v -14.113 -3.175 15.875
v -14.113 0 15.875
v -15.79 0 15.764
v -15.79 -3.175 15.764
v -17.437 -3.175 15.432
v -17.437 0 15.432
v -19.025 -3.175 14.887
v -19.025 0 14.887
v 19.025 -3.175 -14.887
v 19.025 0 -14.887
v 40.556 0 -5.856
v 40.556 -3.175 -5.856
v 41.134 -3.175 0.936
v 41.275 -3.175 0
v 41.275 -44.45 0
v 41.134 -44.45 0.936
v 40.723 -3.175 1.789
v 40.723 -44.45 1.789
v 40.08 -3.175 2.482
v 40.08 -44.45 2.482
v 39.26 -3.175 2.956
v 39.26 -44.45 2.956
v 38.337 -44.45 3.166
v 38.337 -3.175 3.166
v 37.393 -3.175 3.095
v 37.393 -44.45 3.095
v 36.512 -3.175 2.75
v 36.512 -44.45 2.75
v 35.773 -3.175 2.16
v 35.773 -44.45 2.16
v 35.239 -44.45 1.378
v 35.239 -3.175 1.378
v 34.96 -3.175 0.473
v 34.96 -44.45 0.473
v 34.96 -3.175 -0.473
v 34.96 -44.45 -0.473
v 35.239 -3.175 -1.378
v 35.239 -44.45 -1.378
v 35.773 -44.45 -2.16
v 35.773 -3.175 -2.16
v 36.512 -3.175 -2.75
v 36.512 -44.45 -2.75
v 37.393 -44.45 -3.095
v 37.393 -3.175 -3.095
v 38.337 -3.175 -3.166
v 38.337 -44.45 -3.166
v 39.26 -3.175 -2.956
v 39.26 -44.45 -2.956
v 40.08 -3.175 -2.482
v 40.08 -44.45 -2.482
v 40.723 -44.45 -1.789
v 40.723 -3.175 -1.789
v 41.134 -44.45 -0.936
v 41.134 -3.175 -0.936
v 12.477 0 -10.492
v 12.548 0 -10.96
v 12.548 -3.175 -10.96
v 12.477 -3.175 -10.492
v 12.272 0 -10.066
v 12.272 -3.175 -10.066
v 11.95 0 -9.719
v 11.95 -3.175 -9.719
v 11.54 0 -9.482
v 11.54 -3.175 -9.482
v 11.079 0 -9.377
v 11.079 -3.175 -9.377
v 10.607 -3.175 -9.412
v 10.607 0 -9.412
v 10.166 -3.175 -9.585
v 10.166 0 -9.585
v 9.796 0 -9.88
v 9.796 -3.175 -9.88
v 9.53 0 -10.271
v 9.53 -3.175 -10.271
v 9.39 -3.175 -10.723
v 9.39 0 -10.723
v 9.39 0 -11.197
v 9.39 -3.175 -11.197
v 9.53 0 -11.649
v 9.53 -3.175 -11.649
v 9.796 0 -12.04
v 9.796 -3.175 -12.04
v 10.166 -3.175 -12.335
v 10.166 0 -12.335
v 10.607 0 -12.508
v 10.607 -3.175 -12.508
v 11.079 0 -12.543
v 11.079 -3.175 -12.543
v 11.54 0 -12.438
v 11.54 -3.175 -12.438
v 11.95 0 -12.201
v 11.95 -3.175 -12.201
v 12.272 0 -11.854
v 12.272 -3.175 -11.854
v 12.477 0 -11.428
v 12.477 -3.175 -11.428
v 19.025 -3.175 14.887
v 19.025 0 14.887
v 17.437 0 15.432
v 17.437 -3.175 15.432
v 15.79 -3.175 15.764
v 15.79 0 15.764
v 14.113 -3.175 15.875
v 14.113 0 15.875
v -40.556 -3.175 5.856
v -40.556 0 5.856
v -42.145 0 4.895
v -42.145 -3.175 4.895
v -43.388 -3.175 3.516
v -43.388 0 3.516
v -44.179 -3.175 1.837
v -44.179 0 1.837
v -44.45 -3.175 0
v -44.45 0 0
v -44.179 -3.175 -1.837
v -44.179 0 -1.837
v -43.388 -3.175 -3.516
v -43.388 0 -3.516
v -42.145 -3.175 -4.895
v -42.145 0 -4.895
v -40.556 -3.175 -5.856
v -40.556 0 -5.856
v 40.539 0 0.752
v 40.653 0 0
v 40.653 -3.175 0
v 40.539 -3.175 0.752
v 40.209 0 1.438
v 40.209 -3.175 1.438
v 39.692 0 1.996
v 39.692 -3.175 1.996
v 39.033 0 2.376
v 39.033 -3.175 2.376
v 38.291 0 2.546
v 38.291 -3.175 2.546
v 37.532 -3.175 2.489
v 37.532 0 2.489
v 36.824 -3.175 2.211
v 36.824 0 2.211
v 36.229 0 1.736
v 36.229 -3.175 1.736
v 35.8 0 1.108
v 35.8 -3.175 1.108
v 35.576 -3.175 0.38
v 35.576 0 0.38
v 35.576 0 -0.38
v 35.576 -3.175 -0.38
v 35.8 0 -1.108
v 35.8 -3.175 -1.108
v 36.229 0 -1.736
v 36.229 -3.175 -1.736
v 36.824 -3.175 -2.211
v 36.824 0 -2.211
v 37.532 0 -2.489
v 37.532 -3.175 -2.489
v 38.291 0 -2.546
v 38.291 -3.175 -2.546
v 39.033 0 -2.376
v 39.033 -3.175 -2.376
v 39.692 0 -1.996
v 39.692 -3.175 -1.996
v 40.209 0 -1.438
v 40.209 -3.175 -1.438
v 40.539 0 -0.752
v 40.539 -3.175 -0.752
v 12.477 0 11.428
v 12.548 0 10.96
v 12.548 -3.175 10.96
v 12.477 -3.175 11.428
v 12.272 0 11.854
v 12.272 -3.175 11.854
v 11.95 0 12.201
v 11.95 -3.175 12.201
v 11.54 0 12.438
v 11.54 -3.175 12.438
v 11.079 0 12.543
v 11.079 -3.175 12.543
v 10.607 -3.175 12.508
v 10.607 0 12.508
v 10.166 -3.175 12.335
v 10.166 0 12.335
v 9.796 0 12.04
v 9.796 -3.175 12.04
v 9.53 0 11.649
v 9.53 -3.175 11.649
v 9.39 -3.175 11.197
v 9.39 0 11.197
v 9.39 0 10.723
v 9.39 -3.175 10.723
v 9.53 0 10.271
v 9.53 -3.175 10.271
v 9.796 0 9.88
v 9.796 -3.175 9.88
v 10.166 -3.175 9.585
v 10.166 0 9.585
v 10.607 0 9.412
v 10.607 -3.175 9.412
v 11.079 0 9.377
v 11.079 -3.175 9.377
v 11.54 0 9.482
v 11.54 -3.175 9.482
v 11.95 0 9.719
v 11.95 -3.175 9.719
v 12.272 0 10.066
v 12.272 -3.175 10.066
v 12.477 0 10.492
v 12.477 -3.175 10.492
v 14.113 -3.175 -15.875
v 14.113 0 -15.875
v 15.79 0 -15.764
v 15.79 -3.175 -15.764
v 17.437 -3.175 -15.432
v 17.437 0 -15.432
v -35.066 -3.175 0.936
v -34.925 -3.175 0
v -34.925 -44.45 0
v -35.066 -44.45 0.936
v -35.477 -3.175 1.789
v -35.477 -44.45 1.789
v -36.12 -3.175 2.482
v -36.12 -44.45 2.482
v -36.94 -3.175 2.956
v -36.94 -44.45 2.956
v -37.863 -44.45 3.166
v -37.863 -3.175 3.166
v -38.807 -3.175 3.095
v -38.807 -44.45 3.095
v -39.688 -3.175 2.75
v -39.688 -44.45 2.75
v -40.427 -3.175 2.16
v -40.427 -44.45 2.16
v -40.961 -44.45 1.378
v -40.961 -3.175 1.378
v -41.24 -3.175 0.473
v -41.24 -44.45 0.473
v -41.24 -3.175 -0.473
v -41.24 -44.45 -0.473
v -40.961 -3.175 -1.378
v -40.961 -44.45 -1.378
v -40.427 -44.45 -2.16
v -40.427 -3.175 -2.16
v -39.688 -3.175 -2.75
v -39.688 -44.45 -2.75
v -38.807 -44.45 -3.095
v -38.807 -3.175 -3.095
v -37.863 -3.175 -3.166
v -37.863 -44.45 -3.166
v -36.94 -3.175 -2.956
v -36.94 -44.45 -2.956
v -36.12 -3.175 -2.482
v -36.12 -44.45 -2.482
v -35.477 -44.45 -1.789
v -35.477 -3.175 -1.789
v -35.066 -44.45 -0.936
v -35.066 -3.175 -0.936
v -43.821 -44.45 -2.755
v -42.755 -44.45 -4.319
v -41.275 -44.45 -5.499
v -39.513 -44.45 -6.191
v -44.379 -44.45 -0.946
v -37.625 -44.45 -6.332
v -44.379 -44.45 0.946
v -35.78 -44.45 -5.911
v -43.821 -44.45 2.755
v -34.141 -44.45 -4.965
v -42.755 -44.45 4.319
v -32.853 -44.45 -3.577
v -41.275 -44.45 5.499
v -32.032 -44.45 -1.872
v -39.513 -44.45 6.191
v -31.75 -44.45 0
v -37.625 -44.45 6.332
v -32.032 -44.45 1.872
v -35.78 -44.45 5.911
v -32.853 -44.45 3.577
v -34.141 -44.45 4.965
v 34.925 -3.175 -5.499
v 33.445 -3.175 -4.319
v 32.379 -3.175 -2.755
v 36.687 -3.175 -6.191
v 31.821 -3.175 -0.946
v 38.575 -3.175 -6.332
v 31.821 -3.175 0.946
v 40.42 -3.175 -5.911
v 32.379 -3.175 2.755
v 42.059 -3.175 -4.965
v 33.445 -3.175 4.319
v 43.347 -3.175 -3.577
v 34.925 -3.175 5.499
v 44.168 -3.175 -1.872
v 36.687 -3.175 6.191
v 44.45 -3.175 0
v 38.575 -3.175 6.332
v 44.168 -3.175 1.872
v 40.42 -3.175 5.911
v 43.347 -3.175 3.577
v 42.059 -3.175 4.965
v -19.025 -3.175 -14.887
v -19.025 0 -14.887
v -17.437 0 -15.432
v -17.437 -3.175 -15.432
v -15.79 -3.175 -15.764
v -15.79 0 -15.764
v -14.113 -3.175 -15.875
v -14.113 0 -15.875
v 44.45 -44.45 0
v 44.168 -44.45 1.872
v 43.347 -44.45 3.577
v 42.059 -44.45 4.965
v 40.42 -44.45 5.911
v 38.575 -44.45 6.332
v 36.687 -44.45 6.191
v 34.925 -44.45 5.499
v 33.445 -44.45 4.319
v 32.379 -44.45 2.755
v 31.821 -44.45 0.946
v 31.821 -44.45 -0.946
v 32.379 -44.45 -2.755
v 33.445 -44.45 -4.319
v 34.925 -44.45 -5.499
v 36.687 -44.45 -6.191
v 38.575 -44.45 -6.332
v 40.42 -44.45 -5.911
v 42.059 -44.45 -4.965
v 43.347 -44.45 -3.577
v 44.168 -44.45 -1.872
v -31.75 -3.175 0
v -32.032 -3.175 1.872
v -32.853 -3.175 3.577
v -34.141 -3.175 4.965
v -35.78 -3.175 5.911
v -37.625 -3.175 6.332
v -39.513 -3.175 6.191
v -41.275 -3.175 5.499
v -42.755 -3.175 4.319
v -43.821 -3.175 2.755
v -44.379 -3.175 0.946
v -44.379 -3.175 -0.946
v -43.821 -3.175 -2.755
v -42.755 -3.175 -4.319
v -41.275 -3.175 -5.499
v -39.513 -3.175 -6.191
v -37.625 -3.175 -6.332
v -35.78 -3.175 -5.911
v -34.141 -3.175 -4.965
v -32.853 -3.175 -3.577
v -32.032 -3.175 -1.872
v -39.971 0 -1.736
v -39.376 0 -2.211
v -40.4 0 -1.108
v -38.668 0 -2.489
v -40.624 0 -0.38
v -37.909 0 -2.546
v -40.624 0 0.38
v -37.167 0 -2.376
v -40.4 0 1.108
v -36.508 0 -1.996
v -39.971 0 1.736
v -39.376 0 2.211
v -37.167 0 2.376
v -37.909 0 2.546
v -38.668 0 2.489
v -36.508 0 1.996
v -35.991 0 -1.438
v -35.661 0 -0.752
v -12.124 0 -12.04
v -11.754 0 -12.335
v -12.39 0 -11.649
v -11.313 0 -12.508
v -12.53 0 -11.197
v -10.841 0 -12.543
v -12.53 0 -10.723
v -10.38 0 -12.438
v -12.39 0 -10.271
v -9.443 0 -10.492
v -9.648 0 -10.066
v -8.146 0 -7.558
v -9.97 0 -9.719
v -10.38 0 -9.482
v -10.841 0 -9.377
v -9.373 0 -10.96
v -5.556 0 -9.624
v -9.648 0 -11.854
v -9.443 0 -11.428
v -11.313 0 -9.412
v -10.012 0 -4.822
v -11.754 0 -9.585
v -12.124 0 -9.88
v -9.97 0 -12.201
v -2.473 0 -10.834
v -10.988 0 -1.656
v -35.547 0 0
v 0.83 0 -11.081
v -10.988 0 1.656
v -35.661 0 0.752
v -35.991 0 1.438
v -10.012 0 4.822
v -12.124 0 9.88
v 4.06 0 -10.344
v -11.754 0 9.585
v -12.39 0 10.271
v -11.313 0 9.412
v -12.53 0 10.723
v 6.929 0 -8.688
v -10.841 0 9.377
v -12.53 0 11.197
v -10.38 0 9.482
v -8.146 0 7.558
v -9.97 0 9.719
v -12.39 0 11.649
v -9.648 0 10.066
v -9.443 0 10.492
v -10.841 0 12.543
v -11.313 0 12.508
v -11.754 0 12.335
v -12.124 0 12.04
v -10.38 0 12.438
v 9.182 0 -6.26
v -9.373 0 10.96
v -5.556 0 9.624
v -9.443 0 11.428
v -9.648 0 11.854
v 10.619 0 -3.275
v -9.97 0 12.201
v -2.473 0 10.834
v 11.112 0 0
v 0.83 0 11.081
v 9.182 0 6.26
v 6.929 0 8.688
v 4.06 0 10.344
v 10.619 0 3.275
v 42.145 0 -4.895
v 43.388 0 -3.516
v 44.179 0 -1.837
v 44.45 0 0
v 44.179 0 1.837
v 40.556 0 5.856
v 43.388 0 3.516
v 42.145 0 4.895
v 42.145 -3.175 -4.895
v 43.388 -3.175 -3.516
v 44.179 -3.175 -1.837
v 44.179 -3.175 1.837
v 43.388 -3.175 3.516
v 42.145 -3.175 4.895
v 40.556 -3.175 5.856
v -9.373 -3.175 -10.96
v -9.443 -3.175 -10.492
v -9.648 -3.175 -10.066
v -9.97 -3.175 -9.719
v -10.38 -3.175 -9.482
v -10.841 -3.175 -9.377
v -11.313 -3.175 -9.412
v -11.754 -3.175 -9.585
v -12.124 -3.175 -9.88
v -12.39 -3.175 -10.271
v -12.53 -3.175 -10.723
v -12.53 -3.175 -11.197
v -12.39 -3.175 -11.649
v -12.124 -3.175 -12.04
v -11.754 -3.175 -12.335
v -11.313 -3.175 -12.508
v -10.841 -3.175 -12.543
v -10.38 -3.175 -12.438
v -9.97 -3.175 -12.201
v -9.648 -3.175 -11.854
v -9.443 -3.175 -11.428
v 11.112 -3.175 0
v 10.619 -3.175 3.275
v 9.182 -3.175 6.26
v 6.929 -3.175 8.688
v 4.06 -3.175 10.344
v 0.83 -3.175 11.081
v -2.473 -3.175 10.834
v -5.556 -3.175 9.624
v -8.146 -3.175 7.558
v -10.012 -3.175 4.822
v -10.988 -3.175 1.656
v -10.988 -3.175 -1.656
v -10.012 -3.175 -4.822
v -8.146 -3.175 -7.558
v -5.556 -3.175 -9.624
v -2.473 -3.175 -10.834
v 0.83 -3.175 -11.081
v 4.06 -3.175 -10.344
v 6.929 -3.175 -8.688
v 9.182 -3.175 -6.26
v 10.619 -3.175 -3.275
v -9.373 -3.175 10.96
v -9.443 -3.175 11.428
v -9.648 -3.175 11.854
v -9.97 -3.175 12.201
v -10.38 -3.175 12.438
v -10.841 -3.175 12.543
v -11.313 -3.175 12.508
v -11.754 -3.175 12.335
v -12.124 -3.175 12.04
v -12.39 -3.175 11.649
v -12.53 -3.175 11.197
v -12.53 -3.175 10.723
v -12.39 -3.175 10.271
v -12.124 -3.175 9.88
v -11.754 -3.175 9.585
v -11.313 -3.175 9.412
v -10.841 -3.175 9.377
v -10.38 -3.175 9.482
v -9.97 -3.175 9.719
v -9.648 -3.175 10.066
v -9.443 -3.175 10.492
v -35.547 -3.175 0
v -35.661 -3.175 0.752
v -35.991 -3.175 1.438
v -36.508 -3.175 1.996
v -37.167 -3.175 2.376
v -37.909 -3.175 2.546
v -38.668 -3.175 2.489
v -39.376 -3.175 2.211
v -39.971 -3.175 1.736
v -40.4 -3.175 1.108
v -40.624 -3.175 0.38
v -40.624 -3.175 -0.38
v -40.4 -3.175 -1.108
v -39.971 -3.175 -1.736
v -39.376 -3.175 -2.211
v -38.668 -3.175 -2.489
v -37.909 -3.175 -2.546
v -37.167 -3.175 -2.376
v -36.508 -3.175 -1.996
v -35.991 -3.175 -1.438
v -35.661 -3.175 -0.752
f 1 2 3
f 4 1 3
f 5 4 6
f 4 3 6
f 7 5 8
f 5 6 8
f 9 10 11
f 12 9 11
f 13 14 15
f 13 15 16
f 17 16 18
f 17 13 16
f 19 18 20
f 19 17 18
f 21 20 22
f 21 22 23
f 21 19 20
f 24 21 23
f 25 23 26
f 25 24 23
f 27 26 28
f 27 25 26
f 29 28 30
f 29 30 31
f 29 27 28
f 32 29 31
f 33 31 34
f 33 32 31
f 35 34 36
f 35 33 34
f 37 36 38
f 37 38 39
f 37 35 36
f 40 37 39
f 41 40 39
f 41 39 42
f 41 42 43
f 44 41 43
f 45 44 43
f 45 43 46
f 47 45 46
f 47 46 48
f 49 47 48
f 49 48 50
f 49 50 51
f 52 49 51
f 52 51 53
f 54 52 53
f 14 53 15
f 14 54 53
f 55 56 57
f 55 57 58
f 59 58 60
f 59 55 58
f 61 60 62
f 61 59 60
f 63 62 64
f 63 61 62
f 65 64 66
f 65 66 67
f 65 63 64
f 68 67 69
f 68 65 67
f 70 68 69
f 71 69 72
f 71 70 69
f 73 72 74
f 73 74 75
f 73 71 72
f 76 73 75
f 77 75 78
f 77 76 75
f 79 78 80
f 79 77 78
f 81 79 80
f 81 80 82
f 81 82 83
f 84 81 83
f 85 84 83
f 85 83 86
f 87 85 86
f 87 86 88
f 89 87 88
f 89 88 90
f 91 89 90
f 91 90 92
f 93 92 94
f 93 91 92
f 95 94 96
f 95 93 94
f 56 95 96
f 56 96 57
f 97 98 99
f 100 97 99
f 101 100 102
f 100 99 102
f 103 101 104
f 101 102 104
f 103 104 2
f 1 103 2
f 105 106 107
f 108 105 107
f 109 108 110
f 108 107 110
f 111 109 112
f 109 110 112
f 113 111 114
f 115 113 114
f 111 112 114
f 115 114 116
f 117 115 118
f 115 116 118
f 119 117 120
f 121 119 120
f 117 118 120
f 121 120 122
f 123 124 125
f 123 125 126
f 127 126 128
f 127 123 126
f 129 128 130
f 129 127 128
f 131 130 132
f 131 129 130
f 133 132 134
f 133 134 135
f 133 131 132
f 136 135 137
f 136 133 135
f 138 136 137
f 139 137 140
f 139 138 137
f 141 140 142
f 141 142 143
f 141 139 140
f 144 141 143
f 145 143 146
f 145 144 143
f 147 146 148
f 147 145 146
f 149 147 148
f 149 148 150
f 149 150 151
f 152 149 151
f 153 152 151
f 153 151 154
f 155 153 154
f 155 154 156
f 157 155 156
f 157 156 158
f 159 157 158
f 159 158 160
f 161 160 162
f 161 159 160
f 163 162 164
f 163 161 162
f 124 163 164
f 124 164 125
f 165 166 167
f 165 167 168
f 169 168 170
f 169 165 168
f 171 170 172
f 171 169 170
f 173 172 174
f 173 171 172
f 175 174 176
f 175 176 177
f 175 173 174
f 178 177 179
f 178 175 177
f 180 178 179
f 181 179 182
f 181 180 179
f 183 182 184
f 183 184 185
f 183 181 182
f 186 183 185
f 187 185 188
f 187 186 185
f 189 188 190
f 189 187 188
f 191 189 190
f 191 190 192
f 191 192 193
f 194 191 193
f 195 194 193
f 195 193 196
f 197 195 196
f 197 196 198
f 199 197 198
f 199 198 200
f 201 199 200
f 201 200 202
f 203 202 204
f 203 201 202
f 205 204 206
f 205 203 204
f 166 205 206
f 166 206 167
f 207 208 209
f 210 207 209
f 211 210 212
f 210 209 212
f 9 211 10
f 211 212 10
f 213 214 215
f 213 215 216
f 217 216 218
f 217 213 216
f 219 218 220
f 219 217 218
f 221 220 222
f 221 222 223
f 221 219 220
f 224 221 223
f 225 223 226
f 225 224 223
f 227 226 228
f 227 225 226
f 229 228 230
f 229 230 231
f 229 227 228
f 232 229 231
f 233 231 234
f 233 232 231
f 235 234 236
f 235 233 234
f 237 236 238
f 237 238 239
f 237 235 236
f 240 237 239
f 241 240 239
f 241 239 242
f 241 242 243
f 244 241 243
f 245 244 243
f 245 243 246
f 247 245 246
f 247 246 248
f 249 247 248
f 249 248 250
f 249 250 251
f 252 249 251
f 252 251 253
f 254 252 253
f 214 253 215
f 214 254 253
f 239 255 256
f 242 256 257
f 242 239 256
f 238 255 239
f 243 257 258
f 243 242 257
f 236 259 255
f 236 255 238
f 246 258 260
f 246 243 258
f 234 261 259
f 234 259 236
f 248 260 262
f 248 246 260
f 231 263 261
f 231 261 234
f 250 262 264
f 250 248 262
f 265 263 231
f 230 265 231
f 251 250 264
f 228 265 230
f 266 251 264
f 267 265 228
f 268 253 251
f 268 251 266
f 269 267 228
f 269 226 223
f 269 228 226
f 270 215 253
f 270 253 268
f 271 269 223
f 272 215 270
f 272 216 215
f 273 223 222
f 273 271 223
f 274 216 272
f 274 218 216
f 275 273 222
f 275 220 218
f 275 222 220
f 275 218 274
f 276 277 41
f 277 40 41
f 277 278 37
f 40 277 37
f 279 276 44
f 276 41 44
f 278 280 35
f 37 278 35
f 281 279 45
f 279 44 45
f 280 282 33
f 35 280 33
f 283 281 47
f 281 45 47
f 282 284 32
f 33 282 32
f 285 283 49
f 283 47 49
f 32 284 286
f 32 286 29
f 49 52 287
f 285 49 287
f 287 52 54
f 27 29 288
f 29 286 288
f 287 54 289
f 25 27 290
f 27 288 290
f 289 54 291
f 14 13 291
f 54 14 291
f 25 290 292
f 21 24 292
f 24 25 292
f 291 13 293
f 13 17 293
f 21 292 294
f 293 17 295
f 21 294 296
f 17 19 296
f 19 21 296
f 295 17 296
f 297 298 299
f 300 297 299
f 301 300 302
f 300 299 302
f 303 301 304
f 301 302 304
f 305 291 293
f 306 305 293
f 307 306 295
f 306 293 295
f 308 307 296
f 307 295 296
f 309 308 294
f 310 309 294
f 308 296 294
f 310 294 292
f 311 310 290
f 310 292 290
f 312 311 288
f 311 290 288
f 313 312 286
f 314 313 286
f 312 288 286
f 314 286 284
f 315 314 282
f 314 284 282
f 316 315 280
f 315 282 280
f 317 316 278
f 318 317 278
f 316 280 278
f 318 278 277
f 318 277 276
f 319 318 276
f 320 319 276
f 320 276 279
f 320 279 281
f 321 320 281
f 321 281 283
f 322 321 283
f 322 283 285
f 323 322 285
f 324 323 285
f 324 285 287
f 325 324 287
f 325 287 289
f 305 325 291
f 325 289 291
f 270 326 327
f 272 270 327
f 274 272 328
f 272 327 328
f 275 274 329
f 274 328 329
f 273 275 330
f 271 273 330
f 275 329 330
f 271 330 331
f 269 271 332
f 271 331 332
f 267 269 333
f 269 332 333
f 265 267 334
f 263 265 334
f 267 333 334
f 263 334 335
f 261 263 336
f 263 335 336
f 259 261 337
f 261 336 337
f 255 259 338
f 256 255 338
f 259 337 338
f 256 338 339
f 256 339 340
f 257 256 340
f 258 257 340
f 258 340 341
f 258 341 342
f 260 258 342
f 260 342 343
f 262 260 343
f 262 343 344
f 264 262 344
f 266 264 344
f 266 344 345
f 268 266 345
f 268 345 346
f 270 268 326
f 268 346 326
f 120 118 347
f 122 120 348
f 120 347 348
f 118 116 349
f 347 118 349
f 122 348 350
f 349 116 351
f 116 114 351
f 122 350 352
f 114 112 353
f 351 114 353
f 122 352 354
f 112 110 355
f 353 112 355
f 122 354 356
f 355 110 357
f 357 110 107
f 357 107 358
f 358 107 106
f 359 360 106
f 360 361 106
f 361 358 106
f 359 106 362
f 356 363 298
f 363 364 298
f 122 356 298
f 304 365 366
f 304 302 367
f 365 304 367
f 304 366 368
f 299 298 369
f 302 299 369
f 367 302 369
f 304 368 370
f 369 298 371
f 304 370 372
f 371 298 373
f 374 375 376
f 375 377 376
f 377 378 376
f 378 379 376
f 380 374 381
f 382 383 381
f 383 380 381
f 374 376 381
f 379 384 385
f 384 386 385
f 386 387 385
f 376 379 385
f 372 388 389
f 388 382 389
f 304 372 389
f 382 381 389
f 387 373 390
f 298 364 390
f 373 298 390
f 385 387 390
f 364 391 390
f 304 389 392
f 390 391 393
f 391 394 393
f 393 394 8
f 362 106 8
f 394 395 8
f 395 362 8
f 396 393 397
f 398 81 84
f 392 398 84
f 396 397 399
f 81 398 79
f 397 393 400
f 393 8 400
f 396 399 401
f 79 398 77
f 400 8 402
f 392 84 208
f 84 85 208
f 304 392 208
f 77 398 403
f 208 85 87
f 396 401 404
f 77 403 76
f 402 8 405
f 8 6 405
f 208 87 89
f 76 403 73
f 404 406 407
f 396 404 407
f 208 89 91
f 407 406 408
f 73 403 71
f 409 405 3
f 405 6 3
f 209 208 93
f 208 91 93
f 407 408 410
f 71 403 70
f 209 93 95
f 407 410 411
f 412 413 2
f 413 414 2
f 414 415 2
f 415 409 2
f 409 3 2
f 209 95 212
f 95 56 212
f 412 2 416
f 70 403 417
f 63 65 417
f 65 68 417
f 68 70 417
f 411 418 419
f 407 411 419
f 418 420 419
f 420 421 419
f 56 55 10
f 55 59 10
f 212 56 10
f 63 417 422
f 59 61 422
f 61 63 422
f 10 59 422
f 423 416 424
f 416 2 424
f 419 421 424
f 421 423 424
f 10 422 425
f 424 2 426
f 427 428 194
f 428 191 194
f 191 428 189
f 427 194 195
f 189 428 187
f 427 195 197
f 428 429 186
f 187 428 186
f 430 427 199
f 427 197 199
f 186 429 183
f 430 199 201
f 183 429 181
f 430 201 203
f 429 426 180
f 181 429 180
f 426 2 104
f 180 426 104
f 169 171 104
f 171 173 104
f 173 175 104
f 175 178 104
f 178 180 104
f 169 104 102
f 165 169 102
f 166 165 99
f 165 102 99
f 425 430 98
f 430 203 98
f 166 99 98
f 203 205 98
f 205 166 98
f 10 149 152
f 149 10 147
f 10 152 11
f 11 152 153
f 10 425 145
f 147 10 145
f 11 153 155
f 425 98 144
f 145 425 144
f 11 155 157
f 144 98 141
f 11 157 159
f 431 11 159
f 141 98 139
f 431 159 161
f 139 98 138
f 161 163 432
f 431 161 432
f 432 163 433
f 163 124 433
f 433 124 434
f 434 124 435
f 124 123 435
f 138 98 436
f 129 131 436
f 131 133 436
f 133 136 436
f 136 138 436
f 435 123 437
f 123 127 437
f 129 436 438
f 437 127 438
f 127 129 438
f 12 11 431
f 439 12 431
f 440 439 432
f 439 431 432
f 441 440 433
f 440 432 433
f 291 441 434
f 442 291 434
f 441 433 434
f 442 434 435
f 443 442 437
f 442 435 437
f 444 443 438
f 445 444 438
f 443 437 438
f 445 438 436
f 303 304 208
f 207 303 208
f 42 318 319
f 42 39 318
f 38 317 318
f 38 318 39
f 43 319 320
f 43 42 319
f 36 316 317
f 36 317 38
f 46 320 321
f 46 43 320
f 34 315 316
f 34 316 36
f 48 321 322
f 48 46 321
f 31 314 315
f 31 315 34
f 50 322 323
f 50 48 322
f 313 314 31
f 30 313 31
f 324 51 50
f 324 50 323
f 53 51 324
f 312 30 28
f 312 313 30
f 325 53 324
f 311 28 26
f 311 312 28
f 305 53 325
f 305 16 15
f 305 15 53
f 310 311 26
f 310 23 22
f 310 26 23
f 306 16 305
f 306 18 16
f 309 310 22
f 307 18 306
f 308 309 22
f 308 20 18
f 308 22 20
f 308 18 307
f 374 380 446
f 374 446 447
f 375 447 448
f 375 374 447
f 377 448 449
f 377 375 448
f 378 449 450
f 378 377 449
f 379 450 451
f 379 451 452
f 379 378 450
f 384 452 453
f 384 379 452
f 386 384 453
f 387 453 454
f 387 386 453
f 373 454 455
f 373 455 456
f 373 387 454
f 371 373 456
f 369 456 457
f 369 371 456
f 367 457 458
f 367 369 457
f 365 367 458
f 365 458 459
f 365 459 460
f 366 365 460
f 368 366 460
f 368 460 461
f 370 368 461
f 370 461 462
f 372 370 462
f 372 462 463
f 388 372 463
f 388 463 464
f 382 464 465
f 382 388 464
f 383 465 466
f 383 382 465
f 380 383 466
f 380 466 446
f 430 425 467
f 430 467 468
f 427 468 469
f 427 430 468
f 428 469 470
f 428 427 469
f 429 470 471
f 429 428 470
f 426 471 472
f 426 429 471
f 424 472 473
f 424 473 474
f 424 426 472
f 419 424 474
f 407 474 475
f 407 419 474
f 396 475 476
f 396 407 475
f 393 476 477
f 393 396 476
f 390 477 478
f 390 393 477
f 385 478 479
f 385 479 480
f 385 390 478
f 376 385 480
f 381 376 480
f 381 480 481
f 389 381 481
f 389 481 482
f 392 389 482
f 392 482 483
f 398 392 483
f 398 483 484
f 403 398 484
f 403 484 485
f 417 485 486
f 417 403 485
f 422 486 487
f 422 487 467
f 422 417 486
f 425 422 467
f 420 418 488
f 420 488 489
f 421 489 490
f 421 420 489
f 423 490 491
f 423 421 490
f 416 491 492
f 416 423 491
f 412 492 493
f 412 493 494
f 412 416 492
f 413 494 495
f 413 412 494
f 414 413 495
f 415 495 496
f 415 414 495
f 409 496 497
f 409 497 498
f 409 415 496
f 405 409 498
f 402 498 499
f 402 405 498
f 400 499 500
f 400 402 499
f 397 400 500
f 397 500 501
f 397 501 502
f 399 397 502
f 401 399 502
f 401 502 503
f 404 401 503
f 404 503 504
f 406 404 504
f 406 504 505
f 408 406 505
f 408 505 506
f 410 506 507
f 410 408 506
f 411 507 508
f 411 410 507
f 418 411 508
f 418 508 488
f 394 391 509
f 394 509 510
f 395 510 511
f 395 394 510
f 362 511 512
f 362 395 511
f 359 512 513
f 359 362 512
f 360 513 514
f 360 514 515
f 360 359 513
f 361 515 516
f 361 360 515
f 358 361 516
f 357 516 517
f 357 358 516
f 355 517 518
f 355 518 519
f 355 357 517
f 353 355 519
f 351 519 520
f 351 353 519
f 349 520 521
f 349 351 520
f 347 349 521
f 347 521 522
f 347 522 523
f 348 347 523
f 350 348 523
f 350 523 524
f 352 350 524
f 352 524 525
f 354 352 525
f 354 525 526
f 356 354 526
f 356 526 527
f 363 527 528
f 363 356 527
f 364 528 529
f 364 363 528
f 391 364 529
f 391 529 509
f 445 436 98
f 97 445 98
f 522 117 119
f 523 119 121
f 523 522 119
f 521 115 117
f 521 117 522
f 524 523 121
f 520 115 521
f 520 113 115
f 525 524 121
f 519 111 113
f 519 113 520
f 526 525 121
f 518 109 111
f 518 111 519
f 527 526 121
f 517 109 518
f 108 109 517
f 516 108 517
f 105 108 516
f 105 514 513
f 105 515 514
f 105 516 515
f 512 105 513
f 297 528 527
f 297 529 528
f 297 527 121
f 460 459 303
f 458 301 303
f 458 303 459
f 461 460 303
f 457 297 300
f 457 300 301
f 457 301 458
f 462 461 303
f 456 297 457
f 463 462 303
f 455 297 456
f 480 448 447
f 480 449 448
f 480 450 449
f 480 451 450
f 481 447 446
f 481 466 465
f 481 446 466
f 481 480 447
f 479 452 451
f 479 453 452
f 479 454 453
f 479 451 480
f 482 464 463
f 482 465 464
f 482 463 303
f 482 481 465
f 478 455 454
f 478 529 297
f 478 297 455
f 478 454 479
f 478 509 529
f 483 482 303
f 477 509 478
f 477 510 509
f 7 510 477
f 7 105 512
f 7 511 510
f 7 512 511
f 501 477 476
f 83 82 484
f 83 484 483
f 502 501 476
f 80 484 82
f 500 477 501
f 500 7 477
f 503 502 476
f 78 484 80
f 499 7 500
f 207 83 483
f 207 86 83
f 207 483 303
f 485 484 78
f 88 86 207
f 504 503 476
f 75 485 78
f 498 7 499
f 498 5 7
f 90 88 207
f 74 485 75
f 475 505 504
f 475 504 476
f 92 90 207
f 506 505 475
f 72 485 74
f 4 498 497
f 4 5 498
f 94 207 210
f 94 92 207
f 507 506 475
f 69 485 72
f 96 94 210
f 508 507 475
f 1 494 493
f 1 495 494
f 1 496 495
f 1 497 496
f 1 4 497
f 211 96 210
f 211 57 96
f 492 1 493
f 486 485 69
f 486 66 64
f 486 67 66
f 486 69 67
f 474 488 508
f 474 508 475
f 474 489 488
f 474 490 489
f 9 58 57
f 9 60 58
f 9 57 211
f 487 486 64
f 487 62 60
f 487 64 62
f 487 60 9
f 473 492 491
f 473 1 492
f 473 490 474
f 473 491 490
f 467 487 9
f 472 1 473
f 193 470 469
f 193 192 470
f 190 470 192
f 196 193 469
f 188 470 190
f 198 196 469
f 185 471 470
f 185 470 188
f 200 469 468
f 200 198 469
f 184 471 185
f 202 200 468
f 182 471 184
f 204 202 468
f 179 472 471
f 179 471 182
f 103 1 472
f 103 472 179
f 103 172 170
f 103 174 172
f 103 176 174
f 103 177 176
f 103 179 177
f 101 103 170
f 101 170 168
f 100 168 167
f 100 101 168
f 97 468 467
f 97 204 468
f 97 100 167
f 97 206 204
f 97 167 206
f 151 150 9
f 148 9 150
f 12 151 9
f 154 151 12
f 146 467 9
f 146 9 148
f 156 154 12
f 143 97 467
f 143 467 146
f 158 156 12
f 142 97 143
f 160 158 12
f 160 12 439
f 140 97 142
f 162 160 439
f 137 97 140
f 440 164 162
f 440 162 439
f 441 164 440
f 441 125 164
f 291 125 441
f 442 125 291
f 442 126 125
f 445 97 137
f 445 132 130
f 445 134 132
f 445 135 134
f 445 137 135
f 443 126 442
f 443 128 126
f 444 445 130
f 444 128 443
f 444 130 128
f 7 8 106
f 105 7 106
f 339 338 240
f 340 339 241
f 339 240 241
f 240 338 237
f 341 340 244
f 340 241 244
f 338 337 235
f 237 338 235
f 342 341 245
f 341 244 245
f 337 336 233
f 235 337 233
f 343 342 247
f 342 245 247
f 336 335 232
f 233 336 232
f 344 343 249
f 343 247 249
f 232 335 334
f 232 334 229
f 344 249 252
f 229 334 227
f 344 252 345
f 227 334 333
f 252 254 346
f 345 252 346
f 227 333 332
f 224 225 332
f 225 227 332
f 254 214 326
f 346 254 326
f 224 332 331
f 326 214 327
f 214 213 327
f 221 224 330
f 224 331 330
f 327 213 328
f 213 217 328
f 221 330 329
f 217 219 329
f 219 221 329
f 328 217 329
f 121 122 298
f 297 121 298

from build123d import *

# Parameters (mm, degrees)
F0_R     = 1.5875
F0_R_2   = 2.5527
F0_R_3   = 11.1125
F1_DEPTH = 3.175
F2_R     = 6.35
F2_R_2   = 3.175
F3_DEPTH = 41.275


with BuildPart() as f1:
    # F0 (on Front) → F1 (new body)
    with BuildSketch(Plane.XZ):
        with BuildLine():
            Line((-19.025418, 14.886527), (-40.556121, 5.855764))
            ThreePointArc((-40.556121, 5.855764), (-44.45, 0), (-40.556121, -5.855764))
            Line((-40.556121, -5.855764), (-19.025418, -14.886527))
            ThreePointArc((-19.025418, -14.886527), (-16.61853, -15.62543), (-14.113175, -15.875))
            Line((-14.113175, -15.875), (14.113175, -15.875))
            ThreePointArc((14.113175, -15.875), (16.61853, -15.62543), (19.025418, -14.886527))
            Line((19.025418, -14.886527), (40.556121, -5.855764))
            ThreePointArc((40.556121, -5.855764), (44.45, 0), (40.556121, 5.855764))
            Line((40.556121, 5.855764), (19.025418, 14.886527))
            ThreePointArc((19.025418, 14.886527), (16.61853, 15.62543), (14.113175, 15.875))
            Line((14.113175, 15.875), (-14.113175, 15.875))
            ThreePointArc((-14.113175, 15.875), (-16.61853, 15.62543), (-19.025418, 14.886527))
        make_face()
        with Locations((-10.9601, -10.9601)):
            Circle(F0_R, mode=Mode.SUBTRACT)
        with Locations((10.9601, -10.9601)):
            Circle(F0_R, mode=Mode.SUBTRACT)
        with Locations((-38.1, 0)):
            Circle(F0_R_2, mode=Mode.SUBTRACT)
        with Locations((-10.9601, 10.9601)):
            Circle(F0_R, mode=Mode.SUBTRACT)
        Circle(F0_R_3, mode=Mode.SUBTRACT)
        with Locations((38.1, 0)):
            Circle(F0_R_2, mode=Mode.SUBTRACT)
        with Locations((10.9601, 10.9601)):
            Circle(F0_R, mode=Mode.SUBTRACT)
    extrude(amount=F1_DEPTH)


with BuildPart() as f3:
    # F2 (on face) → F3 (new body)
    with BuildSketch(Plane.XZ.offset(3.175)):
        with Locations((-38.1, 0)):
            Circle(F2_R)
        with Locations((-38.1, 0)):
            Circle(F2_R_2, mode=Mode.SUBTRACT)
        with Locations((38.1, 0)):
            Circle(F2_R)
        with Locations((38.1, 0)):
            Circle(F2_R_2, mode=Mode.SUBTRACT)
    extrude(amount=F3_DEPTH)


solid = Compound([f1.part, f3.part])
